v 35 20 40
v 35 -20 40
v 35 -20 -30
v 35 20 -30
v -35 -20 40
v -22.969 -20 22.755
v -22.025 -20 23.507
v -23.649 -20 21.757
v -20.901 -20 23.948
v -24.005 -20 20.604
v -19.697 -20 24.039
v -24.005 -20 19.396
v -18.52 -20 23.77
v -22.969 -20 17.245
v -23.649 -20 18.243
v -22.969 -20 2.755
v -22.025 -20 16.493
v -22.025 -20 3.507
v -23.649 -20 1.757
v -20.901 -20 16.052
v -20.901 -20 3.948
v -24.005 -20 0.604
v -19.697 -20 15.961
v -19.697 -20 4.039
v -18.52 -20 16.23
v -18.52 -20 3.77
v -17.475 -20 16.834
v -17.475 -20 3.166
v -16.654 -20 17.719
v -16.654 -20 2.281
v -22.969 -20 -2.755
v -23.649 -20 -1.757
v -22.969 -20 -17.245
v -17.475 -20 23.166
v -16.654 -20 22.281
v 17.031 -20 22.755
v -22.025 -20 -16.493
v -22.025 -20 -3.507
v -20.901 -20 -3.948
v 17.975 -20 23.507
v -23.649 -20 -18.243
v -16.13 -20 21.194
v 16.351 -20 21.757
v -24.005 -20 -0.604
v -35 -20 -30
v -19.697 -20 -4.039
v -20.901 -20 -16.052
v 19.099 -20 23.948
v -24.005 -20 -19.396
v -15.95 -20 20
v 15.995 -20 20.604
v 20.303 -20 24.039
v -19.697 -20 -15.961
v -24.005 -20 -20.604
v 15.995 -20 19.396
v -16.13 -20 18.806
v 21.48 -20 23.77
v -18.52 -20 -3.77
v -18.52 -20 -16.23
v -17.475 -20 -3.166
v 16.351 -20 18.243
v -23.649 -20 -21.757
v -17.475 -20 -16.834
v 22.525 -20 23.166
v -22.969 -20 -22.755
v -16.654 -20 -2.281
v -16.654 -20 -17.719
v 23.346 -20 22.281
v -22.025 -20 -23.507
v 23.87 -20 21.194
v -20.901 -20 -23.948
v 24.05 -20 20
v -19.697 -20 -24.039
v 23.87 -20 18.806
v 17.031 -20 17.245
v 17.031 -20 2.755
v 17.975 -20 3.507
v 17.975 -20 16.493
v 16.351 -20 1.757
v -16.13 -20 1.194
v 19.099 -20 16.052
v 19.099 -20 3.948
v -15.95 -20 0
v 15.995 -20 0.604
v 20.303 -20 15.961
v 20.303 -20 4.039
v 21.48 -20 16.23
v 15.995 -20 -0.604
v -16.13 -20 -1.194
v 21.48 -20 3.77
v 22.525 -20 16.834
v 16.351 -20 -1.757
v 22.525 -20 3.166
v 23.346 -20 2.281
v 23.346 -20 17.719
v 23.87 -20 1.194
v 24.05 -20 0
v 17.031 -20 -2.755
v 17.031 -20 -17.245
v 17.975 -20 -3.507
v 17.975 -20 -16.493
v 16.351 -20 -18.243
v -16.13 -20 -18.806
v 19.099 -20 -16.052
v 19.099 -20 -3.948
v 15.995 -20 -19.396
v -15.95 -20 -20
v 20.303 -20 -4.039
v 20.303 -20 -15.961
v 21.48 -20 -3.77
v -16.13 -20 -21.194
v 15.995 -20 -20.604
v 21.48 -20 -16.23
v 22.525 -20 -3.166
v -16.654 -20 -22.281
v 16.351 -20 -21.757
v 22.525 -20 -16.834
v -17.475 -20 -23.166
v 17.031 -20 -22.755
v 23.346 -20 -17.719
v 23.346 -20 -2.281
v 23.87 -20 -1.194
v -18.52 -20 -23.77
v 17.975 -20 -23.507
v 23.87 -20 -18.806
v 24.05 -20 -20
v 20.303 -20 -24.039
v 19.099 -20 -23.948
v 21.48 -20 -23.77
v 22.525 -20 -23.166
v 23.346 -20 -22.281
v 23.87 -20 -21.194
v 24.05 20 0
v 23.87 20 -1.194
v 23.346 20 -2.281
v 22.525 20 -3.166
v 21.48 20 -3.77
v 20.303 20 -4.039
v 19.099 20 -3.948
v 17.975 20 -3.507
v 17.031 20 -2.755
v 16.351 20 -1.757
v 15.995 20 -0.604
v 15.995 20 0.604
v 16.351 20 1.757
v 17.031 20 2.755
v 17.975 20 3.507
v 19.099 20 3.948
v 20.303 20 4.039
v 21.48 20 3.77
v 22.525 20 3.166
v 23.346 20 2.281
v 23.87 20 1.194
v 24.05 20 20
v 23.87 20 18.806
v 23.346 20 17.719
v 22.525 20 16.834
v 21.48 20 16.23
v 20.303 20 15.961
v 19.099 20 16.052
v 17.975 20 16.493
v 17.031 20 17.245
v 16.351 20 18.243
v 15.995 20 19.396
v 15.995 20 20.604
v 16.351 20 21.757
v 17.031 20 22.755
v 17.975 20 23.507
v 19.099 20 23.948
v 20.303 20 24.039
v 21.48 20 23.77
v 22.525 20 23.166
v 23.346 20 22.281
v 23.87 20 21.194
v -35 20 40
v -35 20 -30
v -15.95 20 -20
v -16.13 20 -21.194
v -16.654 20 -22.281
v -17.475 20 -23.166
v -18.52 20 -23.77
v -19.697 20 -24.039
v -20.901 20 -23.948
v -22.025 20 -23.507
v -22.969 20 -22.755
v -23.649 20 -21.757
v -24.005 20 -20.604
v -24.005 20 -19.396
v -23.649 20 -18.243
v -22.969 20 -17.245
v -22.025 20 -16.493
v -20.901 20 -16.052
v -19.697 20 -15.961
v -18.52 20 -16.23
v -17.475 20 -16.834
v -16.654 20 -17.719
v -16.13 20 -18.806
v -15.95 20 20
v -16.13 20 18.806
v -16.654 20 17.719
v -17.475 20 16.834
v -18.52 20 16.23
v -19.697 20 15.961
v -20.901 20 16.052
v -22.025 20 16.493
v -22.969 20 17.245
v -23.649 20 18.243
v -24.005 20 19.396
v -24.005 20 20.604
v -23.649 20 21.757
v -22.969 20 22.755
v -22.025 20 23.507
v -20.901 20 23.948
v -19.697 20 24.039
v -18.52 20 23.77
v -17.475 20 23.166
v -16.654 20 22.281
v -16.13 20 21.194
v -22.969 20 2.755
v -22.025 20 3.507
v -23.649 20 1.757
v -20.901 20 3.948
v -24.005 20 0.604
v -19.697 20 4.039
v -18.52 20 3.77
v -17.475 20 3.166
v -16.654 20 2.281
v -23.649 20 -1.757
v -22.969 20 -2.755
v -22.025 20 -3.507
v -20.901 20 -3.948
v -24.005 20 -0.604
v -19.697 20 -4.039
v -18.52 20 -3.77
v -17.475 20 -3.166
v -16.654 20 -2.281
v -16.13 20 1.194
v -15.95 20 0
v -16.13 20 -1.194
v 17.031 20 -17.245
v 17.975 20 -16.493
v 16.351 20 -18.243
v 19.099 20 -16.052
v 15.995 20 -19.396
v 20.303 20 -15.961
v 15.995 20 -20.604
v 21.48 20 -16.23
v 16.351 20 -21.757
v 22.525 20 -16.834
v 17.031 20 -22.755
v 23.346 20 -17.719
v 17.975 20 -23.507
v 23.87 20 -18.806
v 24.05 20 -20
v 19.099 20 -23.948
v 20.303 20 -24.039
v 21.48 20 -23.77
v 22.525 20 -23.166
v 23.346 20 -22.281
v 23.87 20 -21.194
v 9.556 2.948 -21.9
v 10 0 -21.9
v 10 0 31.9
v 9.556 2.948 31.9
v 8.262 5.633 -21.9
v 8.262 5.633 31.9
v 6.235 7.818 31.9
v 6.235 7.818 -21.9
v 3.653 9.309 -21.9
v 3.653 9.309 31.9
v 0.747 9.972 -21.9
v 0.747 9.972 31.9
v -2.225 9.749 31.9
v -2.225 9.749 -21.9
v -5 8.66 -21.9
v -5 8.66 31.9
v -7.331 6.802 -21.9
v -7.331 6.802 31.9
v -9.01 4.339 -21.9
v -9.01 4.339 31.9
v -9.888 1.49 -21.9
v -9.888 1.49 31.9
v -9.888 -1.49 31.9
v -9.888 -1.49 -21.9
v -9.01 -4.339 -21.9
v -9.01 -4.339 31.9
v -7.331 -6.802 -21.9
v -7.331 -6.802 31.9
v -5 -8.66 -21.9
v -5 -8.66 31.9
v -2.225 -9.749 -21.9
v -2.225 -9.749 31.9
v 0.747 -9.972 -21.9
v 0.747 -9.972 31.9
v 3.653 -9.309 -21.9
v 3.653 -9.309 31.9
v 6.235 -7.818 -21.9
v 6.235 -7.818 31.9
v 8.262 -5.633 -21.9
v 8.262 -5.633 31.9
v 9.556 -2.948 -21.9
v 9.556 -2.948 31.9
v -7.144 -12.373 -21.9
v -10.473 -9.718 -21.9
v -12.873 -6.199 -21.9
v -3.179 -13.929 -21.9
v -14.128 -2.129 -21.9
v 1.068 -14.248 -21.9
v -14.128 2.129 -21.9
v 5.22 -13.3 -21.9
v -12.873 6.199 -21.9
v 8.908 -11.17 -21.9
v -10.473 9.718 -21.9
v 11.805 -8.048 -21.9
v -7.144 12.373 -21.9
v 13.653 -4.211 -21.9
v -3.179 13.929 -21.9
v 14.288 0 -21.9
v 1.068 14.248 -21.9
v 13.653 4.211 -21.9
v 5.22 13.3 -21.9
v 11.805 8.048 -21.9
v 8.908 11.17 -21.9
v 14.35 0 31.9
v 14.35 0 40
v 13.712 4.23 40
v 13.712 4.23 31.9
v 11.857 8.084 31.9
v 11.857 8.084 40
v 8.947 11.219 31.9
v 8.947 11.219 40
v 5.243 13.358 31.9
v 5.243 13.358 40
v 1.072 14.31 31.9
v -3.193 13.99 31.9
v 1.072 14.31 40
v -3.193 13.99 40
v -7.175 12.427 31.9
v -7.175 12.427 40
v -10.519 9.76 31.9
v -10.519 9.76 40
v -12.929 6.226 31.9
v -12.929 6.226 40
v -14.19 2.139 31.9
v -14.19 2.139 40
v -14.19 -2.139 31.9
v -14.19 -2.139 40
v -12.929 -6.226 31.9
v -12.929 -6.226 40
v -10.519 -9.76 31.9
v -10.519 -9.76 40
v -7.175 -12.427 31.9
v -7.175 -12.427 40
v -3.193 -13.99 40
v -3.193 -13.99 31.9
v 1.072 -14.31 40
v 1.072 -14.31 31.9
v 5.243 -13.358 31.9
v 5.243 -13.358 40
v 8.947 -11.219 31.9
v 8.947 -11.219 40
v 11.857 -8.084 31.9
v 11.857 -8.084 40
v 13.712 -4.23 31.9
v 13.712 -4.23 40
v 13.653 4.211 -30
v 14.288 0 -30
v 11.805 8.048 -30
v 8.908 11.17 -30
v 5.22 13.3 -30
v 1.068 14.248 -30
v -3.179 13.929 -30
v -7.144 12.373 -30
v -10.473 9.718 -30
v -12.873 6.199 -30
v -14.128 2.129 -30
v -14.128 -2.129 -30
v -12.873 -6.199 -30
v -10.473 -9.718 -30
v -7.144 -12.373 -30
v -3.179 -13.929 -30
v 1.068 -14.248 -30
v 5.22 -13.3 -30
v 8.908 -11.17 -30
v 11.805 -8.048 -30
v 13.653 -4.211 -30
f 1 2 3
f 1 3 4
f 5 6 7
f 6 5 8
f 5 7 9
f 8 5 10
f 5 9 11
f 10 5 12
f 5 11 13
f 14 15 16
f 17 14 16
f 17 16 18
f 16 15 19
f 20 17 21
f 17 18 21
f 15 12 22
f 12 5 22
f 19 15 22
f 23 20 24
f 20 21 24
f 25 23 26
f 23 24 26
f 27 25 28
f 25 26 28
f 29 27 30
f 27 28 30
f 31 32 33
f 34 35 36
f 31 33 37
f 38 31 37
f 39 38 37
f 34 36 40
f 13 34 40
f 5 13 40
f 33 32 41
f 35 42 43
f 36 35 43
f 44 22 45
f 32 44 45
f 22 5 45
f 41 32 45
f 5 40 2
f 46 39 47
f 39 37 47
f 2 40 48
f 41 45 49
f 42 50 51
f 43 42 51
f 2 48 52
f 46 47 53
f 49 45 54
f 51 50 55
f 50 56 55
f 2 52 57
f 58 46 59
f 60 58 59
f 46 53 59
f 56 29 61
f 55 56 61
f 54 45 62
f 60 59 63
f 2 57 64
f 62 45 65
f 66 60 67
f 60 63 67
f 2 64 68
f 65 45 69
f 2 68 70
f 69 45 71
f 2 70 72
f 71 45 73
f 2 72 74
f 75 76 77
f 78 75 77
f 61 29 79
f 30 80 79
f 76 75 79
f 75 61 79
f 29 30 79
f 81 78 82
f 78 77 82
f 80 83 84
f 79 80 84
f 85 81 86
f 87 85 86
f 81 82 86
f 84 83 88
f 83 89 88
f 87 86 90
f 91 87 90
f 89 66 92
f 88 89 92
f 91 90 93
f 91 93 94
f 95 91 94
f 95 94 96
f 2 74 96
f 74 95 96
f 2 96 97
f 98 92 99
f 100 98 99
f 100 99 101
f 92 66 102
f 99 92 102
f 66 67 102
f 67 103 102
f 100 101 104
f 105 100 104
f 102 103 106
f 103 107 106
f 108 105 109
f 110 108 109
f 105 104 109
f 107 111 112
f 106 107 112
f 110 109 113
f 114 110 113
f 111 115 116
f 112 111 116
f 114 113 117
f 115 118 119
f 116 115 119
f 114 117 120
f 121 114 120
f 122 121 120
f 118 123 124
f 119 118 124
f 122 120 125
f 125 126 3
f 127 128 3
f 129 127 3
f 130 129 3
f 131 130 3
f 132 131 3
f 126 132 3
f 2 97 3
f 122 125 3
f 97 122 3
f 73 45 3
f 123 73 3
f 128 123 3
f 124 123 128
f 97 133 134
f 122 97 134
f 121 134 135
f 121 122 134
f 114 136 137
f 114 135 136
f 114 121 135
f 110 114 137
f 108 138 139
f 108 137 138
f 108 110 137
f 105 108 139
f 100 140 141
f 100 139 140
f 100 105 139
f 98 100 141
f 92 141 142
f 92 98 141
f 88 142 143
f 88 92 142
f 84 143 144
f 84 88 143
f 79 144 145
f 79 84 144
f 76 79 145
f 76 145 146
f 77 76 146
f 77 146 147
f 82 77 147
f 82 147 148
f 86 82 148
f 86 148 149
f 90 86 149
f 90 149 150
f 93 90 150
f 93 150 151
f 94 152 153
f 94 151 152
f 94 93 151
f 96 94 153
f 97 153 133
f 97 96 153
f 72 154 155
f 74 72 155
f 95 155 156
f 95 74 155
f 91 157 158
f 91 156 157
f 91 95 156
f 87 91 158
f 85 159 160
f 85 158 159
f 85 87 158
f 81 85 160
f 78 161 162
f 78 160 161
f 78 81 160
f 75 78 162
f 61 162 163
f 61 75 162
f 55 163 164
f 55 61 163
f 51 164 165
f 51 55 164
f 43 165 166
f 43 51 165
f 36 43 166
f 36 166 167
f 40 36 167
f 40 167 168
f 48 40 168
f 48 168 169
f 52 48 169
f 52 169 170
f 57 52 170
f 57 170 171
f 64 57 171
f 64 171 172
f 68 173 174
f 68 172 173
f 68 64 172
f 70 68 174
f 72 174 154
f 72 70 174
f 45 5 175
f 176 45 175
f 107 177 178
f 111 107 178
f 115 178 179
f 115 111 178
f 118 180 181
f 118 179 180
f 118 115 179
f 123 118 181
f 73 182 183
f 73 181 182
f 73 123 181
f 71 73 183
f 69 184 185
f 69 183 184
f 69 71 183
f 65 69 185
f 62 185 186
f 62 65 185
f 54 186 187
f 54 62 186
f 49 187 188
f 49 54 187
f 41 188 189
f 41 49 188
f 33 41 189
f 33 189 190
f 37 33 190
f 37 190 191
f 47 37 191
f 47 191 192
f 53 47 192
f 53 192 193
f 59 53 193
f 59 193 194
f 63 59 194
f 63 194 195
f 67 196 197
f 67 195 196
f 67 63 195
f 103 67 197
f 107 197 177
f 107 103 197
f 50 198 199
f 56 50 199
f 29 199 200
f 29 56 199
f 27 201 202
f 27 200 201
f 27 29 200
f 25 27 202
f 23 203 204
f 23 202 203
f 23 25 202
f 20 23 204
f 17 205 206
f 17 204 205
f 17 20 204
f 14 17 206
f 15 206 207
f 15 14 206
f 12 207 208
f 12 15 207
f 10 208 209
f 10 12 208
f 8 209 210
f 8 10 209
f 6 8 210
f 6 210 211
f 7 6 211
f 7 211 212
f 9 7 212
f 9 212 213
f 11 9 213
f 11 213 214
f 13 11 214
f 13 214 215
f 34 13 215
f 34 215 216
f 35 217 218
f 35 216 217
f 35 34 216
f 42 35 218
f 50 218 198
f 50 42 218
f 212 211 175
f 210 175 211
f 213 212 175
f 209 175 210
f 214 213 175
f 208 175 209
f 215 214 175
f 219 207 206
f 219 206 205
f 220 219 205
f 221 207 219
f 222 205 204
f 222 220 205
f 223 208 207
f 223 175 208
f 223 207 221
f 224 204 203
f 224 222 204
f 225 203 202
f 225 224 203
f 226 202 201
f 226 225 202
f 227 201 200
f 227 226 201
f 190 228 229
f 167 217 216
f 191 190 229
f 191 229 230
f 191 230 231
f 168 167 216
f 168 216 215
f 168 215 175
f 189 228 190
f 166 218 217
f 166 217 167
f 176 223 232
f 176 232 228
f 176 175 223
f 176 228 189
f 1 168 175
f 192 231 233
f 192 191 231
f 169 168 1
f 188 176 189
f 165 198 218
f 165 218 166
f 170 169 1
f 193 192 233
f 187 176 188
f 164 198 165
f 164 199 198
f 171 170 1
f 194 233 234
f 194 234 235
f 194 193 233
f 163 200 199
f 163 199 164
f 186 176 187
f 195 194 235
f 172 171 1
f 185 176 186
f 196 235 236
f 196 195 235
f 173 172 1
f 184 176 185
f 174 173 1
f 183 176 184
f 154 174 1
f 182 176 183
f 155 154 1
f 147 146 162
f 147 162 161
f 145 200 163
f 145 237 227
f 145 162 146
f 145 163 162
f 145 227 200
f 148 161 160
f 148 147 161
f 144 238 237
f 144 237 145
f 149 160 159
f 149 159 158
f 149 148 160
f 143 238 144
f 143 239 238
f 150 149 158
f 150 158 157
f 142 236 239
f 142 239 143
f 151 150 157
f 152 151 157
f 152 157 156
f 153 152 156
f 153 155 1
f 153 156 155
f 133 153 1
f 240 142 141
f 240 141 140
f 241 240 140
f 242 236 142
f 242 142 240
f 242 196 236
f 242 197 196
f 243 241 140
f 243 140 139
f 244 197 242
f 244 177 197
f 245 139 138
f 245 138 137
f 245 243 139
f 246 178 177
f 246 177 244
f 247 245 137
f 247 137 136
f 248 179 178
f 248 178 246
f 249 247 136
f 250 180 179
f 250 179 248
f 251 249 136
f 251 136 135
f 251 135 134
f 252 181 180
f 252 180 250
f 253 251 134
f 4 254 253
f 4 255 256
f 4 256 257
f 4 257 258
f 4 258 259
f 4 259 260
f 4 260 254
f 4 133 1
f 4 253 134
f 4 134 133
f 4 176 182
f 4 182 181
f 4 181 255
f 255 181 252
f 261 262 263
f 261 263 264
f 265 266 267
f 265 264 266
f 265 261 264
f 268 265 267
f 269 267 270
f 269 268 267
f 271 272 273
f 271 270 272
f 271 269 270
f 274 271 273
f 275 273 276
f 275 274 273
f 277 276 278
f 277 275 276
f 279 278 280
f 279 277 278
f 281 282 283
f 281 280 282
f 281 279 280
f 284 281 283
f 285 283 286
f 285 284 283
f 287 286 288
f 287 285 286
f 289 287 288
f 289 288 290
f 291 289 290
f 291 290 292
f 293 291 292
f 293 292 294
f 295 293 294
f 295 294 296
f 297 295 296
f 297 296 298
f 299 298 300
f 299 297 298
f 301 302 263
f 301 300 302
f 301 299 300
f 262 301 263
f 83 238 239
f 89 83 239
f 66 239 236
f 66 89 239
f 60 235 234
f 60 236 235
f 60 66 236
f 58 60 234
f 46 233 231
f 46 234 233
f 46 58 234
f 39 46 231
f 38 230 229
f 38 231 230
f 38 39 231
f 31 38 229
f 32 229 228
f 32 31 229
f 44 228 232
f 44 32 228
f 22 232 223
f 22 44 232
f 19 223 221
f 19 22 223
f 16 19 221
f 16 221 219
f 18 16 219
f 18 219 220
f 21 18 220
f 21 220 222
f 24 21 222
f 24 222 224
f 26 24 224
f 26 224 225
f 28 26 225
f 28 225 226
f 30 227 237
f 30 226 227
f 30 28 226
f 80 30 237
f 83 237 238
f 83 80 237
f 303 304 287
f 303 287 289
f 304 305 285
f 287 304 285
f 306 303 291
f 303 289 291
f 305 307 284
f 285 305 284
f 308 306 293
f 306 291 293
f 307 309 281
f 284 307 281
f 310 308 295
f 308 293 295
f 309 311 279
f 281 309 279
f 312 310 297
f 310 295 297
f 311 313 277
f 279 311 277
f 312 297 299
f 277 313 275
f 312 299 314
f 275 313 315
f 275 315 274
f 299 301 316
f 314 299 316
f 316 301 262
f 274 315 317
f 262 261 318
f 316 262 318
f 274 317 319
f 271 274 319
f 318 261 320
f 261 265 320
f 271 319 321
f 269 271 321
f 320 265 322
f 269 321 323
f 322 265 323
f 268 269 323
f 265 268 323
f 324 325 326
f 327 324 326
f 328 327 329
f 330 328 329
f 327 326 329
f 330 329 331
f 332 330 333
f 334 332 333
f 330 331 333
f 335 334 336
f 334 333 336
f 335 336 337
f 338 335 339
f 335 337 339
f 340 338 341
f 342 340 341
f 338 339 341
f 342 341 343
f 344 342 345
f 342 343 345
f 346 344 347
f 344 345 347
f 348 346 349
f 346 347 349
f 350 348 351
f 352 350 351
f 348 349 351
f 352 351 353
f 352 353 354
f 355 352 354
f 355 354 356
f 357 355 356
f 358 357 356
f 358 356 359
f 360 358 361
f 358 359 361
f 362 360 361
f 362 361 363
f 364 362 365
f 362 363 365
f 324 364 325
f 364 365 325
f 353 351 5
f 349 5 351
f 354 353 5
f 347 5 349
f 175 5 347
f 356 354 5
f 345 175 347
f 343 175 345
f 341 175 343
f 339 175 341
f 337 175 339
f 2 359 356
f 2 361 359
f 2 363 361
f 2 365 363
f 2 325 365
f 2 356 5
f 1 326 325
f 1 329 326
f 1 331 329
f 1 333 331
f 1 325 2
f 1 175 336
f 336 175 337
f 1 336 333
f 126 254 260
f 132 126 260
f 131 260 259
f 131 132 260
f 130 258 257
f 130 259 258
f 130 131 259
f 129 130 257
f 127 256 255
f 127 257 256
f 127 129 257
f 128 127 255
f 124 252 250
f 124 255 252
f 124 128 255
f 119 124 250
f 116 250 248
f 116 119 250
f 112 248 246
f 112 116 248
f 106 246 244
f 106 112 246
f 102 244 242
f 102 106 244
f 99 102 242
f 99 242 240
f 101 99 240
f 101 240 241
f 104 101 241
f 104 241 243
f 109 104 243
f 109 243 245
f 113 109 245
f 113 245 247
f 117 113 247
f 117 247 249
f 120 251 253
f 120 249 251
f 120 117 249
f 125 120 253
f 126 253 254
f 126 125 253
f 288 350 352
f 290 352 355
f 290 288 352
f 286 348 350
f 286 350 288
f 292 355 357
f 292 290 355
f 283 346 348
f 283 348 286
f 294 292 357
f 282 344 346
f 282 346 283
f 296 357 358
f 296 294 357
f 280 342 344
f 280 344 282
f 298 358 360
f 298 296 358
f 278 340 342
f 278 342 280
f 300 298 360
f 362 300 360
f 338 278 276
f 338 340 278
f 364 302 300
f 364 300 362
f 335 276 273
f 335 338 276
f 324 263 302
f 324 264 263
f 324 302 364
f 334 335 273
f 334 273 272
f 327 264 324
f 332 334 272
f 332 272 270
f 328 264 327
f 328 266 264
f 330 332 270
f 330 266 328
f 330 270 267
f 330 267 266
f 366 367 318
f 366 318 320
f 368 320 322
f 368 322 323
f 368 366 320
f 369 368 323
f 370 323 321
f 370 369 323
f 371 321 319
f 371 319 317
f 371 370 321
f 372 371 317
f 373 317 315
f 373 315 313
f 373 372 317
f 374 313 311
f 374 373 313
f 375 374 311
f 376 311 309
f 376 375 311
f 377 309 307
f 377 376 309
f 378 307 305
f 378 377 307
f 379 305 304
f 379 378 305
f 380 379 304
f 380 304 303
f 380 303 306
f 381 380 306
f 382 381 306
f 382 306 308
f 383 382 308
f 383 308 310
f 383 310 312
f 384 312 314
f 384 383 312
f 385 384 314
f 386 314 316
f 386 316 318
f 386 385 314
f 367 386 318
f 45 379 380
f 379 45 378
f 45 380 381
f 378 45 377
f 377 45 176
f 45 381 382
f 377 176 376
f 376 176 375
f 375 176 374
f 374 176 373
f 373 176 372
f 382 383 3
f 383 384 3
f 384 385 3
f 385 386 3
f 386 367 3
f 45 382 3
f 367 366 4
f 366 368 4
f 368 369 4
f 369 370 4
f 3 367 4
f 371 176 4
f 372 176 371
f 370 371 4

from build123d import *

# Parameters (mm, degrees)
BOSS_EXTRUDE1_DEPTH      = 40
BOSS_EXTRUDE1_DEPTH_BACK = 30
SKETCH1_W                = 70
SKETCH1_H                = 40
SKETCH1_R                = 10
CUT_EXTRUDE1_DEPTH       = 25
CUT_EXTRUDE1_DEPTH_BACK  = 25
SKETCH2_R                = 4.05
CUT_EXTRUDE2_START       = 40
SKETCH3_R                = 14.35
CUT_EXTRUDE2_DEPTH       = 8.1
CUT_EXTRUDE3_START       = -30
SKETCH4_R                = 14.2875
CUT_EXTRUDE3_DEPTH       = 8.1


with BuildPart() as part:
    # Sketch1 → Boss-Extrude1 (new, two sides: drawn at the far end of the back side and taken through both)
    with BuildSketch(Plane.XY.offset(-BOSS_EXTRUDE1_DEPTH_BACK)):
        Rectangle(SKETCH1_W, SKETCH1_H)
        Circle(SKETCH1_R, mode=Mode.SUBTRACT)
    extrude(amount=BOSS_EXTRUDE1_DEPTH + BOSS_EXTRUDE1_DEPTH_BACK)

    # Sketch2 → Cut-Extrude1 (cut, two sides: drawn at the far end of the back side and taken through both)
    with BuildSketch(Plane(origin=(0, 0, 0), x_dir=(1, 0, 0), z_dir=(0, 1, 0)).offset(-CUT_EXTRUDE1_DEPTH_BACK)):
        with Locations((-20, 20)):
            Circle(SKETCH2_R)
        with Locations((20, 20)):
            Circle(SKETCH2_R)
        with Locations((-20, -20)):
            Circle(SKETCH2_R)
        with Locations((20, -20)):
            Circle(SKETCH2_R)
        with Locations((-20, 0)):
            Circle(SKETCH2_R)
        with Locations((20, 0)):
            Circle(SKETCH2_R)
    extrude(amount=CUT_EXTRUDE1_DEPTH + CUT_EXTRUDE1_DEPTH_BACK, mode=Mode.SUBTRACT)

    # Sketch3 → Cut-Extrude2 (cut)
    with BuildSketch(Plane.XY.offset(CUT_EXTRUDE2_START)):
        Circle(SKETCH3_R)
    extrude(amount=-CUT_EXTRUDE2_DEPTH, mode=Mode.SUBTRACT)

    # Sketch4 → Cut-Extrude3 (cut)
    with BuildSketch(Plane.XY.offset(CUT_EXTRUDE3_START)):
        Circle(SKETCH4_R)
    extrude(amount=CUT_EXTRUDE3_DEPTH, mode=Mode.SUBTRACT)


solid = part.part
